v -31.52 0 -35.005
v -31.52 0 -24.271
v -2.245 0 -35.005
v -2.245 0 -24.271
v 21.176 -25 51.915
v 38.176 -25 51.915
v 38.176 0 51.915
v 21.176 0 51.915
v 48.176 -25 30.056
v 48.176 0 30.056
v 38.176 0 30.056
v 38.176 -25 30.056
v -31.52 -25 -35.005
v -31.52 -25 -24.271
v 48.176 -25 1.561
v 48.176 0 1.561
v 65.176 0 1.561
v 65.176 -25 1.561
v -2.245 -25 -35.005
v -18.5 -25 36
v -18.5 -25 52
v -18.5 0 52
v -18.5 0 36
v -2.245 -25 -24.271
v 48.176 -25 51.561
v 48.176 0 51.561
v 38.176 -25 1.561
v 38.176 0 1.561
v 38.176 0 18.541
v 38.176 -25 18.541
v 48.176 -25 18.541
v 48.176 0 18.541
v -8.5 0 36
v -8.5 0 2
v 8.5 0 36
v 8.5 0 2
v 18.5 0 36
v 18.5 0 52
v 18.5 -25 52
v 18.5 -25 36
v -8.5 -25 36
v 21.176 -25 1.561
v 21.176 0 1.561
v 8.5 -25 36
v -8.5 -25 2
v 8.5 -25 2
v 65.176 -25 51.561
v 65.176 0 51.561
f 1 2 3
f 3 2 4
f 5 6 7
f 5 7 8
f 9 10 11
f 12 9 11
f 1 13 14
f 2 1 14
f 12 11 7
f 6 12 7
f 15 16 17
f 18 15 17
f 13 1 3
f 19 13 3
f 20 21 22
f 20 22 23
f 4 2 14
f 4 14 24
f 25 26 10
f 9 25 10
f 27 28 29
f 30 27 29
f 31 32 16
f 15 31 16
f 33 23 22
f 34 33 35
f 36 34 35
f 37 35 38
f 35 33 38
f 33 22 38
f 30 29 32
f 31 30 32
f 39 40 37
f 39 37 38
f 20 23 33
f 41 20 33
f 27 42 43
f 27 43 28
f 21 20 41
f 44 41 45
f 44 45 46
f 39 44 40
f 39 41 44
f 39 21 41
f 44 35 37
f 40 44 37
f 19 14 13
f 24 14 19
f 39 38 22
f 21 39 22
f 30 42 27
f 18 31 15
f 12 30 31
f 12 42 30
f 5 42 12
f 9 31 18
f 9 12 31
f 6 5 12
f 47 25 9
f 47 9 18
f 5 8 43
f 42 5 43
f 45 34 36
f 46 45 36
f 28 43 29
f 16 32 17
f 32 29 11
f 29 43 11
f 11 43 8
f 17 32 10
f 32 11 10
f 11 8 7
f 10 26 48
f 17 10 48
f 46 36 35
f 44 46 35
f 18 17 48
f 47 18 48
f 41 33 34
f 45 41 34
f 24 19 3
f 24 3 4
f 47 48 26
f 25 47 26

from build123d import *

# Parameters (mm, degrees)
F0_W     = 29.275094
F0_H     = 10.734205
F1_DEPTH = 25


with BuildPart() as f1:
    # F0 (on Front) → F1 (new body)
    with BuildSketch(Plane.XZ):
        Polygon((18.5, 52), (-18.5, 52), (-18.5, 36), (-8.5, 36), (-8.5, 2), (8.5, 2), (8.5, 36), (18.5, 36), align=None)
        Polygon((38.175651, 30.055763), (38.175651, 51.914502), (21.175651, 51.914502), (21.175651, 1.561338), (38.175651, 1.561338), (38.175651, 18.540893), (48.175651, 18.540893), (48.175651, 1.561338), (65.175651, 1.561338), (65.175651, 51.561338), (48.175651, 51.561338), (48.175651, 30.055763), align=None)
        with Locations((-16.882745, -29.638057)):
            Rectangle(F0_W, F0_H)
    extrude(amount=F1_DEPTH)


solid = f1.part
